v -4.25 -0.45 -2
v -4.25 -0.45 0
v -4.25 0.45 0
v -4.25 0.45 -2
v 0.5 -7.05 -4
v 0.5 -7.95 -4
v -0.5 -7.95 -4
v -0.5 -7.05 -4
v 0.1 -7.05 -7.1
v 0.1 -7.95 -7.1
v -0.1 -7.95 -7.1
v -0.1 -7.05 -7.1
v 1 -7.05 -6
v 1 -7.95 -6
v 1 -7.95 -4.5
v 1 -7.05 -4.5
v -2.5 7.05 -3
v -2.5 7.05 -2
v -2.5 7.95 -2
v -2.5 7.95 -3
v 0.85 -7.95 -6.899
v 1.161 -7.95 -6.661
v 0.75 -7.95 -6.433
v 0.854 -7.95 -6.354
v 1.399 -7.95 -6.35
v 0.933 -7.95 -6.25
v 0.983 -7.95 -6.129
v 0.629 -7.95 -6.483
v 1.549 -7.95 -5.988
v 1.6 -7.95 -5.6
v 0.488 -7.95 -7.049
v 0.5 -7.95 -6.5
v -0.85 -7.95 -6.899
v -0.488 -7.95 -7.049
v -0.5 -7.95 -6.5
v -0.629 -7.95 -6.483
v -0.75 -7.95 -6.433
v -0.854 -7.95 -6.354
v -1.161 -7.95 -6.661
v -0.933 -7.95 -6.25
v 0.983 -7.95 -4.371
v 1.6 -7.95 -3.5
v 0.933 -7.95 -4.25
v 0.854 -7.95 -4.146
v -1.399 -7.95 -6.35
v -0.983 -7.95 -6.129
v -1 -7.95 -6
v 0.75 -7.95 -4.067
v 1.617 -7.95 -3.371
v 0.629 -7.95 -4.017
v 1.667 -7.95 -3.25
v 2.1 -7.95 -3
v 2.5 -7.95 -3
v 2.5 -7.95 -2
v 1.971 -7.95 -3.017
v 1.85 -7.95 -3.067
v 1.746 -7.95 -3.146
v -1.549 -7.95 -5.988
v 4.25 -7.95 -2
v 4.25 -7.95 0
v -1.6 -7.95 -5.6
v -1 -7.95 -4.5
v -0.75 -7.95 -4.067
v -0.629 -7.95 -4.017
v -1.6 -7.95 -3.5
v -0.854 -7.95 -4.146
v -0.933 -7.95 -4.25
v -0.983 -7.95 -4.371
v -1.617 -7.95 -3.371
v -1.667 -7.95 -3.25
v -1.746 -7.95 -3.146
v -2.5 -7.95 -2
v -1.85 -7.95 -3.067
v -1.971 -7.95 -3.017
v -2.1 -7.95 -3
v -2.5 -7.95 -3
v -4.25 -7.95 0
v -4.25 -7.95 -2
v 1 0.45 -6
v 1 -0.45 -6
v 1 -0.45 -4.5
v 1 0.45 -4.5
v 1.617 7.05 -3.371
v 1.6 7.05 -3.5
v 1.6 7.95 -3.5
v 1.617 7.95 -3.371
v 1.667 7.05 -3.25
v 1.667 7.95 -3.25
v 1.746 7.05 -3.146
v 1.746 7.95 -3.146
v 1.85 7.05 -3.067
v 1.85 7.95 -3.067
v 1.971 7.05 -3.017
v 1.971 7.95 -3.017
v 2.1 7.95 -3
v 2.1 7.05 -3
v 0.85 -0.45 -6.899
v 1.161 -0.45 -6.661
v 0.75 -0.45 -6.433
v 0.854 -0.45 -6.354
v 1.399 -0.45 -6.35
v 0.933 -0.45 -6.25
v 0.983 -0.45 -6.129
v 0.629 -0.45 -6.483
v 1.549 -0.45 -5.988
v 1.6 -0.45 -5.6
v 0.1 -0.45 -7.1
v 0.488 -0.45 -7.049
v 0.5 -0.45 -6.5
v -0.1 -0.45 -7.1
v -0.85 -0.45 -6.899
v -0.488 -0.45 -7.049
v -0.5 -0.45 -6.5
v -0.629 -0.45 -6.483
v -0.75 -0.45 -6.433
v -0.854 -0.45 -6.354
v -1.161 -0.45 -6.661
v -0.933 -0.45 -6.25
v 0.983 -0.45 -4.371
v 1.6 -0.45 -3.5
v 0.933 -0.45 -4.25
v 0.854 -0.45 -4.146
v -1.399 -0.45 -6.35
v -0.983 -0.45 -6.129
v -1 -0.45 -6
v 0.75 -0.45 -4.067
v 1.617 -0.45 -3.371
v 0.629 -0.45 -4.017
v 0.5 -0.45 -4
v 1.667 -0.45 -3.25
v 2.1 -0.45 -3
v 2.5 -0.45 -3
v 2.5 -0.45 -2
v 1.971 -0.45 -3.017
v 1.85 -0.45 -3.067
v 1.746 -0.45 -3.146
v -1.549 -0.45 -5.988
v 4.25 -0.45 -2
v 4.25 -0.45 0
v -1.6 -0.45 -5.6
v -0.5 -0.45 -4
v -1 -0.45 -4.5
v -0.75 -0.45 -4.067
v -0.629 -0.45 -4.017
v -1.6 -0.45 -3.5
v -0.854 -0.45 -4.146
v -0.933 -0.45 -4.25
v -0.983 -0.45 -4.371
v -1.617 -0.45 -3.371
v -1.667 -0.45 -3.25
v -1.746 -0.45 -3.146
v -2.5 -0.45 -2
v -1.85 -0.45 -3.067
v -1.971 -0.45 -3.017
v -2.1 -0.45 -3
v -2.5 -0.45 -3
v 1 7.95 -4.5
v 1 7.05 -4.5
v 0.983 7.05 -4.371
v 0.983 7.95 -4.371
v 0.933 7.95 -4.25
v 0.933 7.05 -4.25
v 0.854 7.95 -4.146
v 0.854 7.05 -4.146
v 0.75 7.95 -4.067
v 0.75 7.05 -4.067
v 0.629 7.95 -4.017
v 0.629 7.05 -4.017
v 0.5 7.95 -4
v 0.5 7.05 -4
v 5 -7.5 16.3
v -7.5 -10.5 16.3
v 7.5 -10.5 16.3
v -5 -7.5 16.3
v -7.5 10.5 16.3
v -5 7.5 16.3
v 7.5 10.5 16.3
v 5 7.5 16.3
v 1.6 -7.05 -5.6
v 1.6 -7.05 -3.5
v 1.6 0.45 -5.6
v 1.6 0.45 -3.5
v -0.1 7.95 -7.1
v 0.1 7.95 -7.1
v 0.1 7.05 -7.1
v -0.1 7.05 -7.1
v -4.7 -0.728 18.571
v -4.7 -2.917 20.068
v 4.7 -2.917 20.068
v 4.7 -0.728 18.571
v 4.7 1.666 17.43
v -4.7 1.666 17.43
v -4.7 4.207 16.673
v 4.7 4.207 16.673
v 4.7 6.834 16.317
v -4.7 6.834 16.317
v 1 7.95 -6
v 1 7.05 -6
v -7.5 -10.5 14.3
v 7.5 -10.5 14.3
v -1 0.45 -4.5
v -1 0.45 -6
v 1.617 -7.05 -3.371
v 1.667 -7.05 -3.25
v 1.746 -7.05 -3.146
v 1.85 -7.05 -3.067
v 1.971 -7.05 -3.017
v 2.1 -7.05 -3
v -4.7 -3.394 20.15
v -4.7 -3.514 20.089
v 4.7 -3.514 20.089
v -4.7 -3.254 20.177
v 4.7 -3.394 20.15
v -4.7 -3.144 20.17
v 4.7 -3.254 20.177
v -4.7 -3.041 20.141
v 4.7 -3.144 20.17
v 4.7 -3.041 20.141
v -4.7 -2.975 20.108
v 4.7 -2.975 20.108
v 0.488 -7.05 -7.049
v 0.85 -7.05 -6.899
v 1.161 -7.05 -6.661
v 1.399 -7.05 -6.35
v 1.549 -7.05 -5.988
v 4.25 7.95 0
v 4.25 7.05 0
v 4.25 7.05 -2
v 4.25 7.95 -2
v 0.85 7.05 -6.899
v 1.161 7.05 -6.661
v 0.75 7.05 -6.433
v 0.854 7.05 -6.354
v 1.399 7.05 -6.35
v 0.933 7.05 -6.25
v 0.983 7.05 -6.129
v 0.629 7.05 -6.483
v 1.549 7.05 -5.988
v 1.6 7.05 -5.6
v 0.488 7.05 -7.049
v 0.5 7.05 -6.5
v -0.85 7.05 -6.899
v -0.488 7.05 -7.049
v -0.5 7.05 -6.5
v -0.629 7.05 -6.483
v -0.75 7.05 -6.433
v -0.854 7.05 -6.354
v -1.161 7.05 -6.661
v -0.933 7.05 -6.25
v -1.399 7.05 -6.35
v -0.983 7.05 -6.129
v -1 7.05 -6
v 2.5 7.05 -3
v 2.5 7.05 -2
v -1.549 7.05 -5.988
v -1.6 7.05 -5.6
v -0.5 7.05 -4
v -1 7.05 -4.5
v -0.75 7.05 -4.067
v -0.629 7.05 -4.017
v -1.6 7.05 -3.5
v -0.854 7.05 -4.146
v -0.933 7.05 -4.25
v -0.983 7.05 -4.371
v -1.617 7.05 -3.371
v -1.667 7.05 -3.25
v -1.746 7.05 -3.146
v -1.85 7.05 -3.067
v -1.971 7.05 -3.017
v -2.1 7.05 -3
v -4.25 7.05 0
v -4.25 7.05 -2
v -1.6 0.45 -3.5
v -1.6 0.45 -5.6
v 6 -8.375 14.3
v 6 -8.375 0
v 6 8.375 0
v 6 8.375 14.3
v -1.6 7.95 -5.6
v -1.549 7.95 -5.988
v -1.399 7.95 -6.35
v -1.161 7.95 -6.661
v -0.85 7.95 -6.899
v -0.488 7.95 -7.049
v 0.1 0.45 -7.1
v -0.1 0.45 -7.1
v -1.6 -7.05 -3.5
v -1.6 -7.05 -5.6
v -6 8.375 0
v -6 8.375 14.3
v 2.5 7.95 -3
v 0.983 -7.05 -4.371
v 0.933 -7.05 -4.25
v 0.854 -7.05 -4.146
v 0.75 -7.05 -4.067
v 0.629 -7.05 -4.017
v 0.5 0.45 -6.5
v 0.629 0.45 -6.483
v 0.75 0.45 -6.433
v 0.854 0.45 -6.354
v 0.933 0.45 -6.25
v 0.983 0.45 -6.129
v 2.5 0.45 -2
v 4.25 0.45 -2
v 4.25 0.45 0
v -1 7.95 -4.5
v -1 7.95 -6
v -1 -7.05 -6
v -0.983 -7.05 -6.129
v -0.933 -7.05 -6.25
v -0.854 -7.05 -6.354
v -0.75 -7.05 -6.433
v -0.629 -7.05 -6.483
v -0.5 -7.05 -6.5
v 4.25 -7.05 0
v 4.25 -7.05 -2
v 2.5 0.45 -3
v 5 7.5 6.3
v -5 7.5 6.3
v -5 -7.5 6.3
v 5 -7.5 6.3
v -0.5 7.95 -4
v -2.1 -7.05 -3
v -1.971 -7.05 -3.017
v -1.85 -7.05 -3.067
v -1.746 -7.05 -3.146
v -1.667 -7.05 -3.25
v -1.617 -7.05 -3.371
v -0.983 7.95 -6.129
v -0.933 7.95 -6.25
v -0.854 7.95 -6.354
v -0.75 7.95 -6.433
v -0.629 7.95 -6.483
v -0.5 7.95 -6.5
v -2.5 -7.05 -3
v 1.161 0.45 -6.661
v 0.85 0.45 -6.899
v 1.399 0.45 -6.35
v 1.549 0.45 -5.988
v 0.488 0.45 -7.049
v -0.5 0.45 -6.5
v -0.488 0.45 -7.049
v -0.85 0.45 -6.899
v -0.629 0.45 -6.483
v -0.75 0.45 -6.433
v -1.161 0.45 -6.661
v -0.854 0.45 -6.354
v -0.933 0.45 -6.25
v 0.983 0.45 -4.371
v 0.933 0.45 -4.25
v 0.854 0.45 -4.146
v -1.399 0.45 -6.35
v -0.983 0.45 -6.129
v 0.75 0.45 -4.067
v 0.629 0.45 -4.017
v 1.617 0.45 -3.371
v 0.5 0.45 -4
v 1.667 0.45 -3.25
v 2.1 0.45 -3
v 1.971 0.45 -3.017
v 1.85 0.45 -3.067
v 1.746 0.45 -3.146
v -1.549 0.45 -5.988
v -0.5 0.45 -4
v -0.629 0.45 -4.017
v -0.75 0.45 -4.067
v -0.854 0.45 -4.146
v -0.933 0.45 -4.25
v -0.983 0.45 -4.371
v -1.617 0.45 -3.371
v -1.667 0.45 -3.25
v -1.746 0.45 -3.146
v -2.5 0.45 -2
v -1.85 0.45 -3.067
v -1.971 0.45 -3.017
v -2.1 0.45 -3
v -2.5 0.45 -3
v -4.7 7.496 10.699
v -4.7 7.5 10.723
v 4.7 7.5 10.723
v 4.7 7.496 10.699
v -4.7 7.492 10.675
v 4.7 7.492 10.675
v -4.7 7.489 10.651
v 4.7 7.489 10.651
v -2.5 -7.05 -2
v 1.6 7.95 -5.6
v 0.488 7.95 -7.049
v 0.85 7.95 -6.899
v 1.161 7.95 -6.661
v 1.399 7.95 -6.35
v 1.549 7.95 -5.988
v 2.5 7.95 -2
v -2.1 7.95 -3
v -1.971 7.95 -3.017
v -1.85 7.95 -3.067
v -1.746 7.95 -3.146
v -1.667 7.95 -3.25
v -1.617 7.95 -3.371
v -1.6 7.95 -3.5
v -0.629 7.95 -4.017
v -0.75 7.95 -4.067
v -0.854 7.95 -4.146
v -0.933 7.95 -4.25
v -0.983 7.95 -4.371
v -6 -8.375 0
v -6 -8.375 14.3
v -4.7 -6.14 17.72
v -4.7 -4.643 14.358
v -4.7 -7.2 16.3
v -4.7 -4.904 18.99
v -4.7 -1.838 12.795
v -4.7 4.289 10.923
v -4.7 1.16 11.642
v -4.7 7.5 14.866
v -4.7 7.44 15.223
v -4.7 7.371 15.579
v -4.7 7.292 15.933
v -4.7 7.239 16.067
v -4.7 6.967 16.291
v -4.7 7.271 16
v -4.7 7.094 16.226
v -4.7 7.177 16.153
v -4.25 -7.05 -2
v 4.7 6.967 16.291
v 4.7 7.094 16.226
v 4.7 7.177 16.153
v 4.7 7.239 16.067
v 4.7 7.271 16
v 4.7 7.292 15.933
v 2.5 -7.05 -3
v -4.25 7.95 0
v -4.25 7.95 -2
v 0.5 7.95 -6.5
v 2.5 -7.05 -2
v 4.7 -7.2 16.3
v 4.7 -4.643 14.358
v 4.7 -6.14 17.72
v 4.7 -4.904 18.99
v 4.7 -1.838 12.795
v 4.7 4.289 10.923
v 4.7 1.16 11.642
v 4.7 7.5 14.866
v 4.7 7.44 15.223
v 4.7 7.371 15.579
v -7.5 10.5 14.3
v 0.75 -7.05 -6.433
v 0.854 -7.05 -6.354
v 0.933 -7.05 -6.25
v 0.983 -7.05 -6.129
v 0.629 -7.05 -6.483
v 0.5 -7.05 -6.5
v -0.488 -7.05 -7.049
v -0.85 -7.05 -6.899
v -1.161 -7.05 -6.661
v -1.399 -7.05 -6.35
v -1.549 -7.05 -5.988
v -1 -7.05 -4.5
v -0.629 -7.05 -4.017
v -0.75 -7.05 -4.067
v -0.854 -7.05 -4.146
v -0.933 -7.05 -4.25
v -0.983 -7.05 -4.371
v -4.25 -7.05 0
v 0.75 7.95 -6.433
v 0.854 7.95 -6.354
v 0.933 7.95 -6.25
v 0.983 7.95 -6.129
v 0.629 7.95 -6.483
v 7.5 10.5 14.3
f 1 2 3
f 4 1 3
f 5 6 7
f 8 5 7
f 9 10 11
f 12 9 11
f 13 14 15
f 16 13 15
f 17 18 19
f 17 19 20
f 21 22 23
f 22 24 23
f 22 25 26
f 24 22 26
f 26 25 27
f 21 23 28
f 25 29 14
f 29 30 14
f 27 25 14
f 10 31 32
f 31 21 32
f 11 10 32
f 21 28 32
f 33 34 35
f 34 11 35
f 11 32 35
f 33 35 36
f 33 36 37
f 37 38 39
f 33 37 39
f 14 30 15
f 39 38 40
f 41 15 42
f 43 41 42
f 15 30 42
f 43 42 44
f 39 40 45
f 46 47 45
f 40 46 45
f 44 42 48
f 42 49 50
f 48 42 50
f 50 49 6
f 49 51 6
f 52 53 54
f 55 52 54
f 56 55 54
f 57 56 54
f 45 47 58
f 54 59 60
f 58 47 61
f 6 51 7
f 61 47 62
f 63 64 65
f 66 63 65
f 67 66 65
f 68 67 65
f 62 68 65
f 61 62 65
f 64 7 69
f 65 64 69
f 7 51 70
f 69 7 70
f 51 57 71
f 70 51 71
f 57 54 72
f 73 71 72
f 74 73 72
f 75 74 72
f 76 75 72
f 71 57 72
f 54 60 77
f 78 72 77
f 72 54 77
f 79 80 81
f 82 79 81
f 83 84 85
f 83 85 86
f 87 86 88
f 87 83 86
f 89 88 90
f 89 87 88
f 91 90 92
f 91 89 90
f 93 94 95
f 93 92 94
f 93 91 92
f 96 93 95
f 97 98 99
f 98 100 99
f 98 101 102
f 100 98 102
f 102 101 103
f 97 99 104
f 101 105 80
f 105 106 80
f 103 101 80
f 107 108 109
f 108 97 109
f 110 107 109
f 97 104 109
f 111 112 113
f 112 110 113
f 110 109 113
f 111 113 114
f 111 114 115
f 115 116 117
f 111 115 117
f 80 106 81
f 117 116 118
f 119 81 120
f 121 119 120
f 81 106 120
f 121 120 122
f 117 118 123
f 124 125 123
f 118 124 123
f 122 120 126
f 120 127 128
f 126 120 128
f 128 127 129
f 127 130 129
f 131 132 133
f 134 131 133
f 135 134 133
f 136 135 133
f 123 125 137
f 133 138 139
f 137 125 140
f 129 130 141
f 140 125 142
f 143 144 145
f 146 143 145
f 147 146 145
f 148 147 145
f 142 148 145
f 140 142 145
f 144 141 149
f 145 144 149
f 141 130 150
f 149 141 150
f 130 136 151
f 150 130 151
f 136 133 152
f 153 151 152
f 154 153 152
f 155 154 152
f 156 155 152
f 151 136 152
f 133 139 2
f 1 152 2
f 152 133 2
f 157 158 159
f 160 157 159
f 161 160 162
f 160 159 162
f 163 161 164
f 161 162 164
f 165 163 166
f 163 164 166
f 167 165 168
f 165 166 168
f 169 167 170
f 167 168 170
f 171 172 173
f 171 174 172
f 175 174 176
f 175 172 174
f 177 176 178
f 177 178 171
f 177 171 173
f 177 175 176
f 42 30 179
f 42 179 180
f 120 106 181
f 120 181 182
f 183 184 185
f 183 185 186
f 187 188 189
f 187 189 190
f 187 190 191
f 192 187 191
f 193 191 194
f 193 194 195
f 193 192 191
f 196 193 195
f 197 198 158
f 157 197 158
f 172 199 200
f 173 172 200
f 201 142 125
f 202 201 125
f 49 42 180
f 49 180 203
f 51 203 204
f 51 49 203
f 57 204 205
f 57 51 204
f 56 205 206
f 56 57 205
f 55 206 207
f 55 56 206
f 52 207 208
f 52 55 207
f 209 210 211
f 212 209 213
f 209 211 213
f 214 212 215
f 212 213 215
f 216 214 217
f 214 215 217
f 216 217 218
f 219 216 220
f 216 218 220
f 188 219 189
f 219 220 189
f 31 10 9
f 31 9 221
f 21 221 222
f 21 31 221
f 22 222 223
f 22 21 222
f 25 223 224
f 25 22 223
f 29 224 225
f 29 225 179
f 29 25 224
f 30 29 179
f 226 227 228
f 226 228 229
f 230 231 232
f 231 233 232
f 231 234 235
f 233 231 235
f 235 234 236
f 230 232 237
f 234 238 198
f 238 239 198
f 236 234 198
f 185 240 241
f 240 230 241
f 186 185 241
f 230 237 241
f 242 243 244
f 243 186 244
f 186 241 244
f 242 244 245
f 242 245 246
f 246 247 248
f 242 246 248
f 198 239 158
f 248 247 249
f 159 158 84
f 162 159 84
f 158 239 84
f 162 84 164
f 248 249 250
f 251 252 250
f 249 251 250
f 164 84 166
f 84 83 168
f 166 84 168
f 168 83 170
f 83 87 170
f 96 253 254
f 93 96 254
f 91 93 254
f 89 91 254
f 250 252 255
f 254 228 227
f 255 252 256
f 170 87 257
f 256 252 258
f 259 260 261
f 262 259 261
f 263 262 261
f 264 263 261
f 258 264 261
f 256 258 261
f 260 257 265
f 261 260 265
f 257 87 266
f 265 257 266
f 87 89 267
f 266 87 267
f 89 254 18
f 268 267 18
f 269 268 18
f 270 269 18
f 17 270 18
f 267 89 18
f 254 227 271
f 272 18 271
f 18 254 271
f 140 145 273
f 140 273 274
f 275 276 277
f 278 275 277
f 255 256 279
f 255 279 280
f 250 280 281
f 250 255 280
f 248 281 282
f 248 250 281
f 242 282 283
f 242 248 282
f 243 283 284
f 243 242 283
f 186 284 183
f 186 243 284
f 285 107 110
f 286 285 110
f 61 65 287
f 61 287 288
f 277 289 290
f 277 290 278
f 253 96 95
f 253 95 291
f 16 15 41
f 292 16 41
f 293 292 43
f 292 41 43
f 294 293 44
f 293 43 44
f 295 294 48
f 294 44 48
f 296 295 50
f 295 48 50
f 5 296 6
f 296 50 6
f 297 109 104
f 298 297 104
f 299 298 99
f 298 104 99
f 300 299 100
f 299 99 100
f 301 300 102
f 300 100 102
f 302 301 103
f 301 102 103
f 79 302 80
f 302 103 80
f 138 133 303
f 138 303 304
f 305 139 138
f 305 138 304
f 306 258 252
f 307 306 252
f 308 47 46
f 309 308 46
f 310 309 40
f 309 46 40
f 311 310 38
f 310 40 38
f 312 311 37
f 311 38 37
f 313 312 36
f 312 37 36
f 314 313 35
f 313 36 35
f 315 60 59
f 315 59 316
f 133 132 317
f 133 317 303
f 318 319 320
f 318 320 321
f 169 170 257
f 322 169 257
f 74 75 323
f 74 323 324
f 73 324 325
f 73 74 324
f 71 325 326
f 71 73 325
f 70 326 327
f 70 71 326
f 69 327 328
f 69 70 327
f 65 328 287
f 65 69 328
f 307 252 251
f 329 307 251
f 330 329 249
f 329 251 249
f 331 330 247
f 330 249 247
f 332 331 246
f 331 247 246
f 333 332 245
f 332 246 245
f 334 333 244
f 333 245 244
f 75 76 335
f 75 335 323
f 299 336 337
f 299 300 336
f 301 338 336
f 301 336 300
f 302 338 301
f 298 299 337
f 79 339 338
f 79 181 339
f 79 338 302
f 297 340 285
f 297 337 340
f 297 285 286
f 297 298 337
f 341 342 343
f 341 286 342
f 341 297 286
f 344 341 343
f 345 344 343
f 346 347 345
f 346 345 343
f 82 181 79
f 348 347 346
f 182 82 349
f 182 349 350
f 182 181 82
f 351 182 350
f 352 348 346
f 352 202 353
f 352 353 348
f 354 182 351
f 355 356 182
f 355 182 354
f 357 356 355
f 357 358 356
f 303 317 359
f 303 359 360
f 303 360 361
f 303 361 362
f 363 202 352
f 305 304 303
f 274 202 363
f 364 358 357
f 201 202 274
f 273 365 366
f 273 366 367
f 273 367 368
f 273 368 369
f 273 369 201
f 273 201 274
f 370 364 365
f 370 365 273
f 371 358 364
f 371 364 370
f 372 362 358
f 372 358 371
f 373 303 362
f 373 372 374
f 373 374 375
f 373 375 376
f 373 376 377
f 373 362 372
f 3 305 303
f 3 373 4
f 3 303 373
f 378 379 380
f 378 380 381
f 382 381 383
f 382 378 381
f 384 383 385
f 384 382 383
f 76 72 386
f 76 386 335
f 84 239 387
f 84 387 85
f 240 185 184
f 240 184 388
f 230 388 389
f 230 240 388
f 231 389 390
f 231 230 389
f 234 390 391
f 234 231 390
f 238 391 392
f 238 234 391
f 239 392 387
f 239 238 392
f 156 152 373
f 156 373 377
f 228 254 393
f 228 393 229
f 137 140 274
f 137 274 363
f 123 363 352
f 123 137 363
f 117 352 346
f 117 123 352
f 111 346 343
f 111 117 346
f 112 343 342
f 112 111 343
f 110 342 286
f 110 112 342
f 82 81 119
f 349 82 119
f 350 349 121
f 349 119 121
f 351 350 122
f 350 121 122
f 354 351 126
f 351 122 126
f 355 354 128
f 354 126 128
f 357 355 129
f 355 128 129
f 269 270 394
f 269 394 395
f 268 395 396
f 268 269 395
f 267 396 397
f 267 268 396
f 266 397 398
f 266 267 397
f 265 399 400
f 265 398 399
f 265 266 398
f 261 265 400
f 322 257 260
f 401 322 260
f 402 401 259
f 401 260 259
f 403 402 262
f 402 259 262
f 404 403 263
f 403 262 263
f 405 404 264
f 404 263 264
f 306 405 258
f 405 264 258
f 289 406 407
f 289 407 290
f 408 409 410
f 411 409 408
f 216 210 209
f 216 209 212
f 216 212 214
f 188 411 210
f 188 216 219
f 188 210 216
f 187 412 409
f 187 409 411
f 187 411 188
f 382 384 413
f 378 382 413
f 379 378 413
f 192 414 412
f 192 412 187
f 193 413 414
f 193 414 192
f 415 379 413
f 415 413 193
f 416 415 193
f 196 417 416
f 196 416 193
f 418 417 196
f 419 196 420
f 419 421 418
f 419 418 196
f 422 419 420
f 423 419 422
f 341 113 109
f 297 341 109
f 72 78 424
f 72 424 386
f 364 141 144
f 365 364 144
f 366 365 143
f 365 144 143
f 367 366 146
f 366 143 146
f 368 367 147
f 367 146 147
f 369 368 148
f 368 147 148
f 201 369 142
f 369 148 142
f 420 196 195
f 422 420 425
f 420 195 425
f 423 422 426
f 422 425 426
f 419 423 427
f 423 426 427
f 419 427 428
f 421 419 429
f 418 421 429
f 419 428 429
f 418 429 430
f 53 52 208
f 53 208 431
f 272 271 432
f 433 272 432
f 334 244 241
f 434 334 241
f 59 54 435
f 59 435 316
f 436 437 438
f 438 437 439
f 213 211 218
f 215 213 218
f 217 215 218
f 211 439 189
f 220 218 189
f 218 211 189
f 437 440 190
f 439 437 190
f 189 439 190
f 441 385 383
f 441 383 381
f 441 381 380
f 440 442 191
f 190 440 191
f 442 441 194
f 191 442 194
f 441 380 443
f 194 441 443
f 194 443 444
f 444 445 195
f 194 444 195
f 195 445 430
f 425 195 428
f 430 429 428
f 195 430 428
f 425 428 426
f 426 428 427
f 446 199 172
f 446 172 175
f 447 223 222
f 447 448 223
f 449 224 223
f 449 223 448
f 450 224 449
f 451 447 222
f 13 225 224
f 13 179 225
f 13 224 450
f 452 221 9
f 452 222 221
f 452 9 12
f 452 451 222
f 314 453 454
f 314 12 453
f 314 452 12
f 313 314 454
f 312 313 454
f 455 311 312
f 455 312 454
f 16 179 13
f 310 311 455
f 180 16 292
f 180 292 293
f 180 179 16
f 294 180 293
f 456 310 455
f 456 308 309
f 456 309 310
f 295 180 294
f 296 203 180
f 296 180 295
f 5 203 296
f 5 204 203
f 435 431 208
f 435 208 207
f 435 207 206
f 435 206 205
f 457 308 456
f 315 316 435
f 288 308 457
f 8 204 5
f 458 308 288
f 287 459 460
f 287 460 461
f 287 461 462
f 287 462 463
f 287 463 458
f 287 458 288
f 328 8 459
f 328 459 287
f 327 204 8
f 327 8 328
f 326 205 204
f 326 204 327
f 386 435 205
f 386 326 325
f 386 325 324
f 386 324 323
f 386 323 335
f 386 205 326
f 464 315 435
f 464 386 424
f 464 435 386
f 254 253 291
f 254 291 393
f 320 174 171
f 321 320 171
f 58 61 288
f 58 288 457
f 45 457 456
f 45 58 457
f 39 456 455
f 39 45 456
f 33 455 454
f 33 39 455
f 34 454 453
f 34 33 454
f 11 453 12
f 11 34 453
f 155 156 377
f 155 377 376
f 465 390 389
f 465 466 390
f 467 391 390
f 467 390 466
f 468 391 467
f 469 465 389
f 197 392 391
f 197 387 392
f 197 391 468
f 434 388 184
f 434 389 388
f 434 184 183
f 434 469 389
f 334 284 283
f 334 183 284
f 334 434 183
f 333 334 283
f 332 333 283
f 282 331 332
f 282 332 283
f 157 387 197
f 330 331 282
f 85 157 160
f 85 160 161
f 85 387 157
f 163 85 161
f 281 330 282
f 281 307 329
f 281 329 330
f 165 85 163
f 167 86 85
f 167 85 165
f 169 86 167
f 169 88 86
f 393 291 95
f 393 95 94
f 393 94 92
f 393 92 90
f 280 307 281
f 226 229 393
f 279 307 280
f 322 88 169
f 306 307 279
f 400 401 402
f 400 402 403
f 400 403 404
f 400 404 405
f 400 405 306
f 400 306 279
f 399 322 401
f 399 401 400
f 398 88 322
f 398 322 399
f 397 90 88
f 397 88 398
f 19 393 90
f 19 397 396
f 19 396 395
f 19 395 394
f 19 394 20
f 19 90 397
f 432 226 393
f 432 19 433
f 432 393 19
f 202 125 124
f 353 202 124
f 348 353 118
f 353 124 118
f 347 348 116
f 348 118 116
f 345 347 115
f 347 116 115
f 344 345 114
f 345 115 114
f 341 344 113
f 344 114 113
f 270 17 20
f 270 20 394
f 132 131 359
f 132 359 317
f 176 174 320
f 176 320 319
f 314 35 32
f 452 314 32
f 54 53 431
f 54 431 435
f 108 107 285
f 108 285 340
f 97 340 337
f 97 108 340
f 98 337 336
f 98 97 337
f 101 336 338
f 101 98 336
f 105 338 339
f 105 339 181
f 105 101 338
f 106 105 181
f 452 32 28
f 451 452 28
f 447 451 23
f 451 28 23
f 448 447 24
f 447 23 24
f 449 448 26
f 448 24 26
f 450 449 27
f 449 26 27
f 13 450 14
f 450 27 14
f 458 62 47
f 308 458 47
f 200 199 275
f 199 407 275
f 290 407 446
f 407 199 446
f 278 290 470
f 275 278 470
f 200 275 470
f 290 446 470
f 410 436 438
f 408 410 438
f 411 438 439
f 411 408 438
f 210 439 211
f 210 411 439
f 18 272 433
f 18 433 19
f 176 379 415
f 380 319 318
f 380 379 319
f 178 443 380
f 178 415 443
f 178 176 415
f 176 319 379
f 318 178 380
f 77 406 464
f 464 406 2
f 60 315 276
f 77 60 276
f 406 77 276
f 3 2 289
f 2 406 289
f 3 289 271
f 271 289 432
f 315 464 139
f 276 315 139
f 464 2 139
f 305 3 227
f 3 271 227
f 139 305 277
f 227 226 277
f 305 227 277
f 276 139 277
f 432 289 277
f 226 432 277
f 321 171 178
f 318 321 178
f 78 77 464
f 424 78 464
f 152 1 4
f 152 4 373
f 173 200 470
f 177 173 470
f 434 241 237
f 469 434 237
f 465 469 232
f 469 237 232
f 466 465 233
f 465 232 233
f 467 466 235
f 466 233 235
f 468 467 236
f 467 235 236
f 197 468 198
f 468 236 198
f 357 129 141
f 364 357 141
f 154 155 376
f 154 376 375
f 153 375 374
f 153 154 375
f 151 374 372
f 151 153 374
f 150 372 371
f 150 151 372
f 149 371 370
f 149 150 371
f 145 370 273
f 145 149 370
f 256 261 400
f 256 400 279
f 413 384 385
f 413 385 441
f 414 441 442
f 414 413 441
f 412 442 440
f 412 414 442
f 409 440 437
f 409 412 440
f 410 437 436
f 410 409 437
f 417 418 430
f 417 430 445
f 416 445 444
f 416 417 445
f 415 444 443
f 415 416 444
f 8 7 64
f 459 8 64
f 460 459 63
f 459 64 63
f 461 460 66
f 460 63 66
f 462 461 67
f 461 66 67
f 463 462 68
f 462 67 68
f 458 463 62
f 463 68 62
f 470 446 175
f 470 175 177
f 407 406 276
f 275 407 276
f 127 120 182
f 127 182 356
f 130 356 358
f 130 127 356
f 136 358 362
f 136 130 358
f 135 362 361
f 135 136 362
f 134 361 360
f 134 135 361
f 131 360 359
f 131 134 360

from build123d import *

# Parameters (mm, degrees)
ESBO_O1_W                     = 12
ESBO_O1_H                     = 16.75
RESSALTO_EXTRUS_O1_DEPTH      = 14.3
ESBO_O2_W                     = 15
ESBO_O2_H                     = 21
RESSALTO_EXTRUS_O2_DEPTH      = 2
ESBO_O3_W                     = 10
ESBO_O3_H                     = 15
CORTE_EXTRUS_O1_DEPTH         = 10
RESSALTO_EXTRUS_O3_DEPTH      = 4.7
RESSALTO_EXTRUS_O3_DEPTH_BACK = 4.7
FILETE1_R                     = 0.5
ESBO_O5_W                     = 8.5
ESBO_O5_H                     = 0.9
RESSALTO_EXTRUS_O4_DEPTH      = 7.1
CORTE_EXTRUS_O2_DEPTH         = 24.950891393
CORTE_EXTRUS_O2_DEPTH_BACK    = 24.950891393


with BuildPart() as part:
    # Esboço1 → Ressalto-extrusão1 (new body)
    with BuildSketch(Plane.XY):
        Rectangle(ESBO_O1_W, ESBO_O1_H)
    extrude(amount=RESSALTO_EXTRUS_O1_DEPTH)

    # Esboço2 → Ressalto-extrusão2 (add)
    with BuildSketch(Plane.XY.offset(14.3)):
        Rectangle(ESBO_O2_W, ESBO_O2_H)
    extrude(amount=RESSALTO_EXTRUS_O2_DEPTH)

    # Esboço3 → Corte-extrusão1 (cut)
    with BuildSketch(Plane.XY.offset(16.3)):
        Rectangle(ESBO_O3_W, ESBO_O3_H)
    extrude(amount=-CORTE_EXTRUS_O1_DEPTH, mode=Mode.SUBTRACT)

    # Esboço4 → Ressalto-extrusão3 (add, two sides: drawn at the far end of the back side and taken through both)
    with BuildSketch(Plane(origin=(0, 0, 0), x_dir=(0, 0, -1), z_dir=(1, 0, 0)).offset(-RESSALTO_EXTRUS_O3_DEPTH_BACK)):
        with BuildLine():
            ThreePointArc((-10.650515464, 7.488659794), (-12.165645544, -0.359367098), (-16.3, -7.2))
            ThreePointArc((-16.3, -7.2), (-18.509688847, -5.409688847), (-20.3, -3.2))
            ThreePointArc((-20.3, -3.2), (-17.43047856, 1.665568677), (-16.3, 7.2))
            ThreePointArc((-16.3, 7.2), (-13.490389917, 7.640488371), (-10.650515464, 7.488659794))
        make_face()
    extrude(amount=RESSALTO_EXTRUS_O3_DEPTH + RESSALTO_EXTRUS_O3_DEPTH_BACK)

    # Filete1
    filete1_edges = [part.edges().sort_by_distance(p)[0] for p in [
        (0, 7.2, 16.3),
        (0, -3.2, 20.3),
    ]]
    fillet(filete1_edges, radius=FILETE1_R)

    # Esboço5 → Ressalto-extrusão4 (add)
    with BuildSketch(Plane(origin=(0, 0, 0), x_dir=(-1, 0, 0), z_dir=(0, 0, -1))):
        Rectangle(ESBO_O5_W, ESBO_O5_H)
        with Locations((0, -7.5)):
            Rectangle(ESBO_O5_W, ESBO_O5_H)
        with Locations((0, 7.5)):
            Rectangle(ESBO_O5_W, ESBO_O5_H)
    extrude(amount=RESSALTO_EXTRUS_O4_DEPTH)

    # Esboço7 → Corte-extrusão2 (cut, two sides: drawn at the far end of the back side and taken through both)
    with BuildSketch(Plane(origin=(0, 0, 0), x_dir=(1, 0, 0), z_dir=(0, 1, 0)).offset(-CORTE_EXTRUS_O2_DEPTH_BACK)):
        with BuildLine():
            Line((2.5, 2), (4.25, 2))
            Line((4.25, 2), (4.25, 7.1))
            Line((4.25, 7.1), (0.1, 7.1))
            ThreePointArc((0.1, 7.1), (1.160660172, 6.660660172), (1.6, 5.6))
            Line((1.6, 5.6), (1.6, 3.5))
            ThreePointArc((1.6, 3.5), (1.746446609, 3.146446609), (2.1, 3))
            Line((2.1, 3), (2.5, 3))
            Line((2.5, 3), (2.5, 2))
        make_face()
        with BuildLine():
            Line((-4.25, 7.1), (-4.25, 2))
            Line((-4.25, 2), (-2.5, 2))
            Line((-2.5, 2), (-2.5, 3))
            Line((-2.5, 3), (-2.1, 3))
            ThreePointArc((-2.1, 3), (-1.746446609, 3.146446609), (-1.6, 3.5))
            Line((-1.6, 3.5), (-1.6, 5.6))
            ThreePointArc((-1.6, 5.6), (-1.160660172, 6.660660172), (-0.1, 7.1))
            Line((-0.1, 7.1), (-4.25, 7.1))
        make_face()
        with BuildLine():
            ThreePointArc((0.5, 6.5), (0.853553391, 6.353553391), (1, 6))
            Line((1, 6), (1, 4.5))
            ThreePointArc((1, 4.5), (0.853553391, 4.146446609), (0.5, 4))
            Line((0.5, 4), (-0.5, 4))
            ThreePointArc((-0.5, 4), (-0.853553391, 4.146446609), (-1, 4.5))
            Line((-1, 4.5), (-1, 6))
            ThreePointArc((-1, 6), (-0.853553391, 6.353553391), (-0.5, 6.5))
            Line((-0.5, 6.5), (0.5, 6.5))
        make_face()
    extrude(amount=CORTE_EXTRUS_O2_DEPTH + CORTE_EXTRUS_O2_DEPTH_BACK, mode=Mode.SUBTRACT)


solid = part.part
